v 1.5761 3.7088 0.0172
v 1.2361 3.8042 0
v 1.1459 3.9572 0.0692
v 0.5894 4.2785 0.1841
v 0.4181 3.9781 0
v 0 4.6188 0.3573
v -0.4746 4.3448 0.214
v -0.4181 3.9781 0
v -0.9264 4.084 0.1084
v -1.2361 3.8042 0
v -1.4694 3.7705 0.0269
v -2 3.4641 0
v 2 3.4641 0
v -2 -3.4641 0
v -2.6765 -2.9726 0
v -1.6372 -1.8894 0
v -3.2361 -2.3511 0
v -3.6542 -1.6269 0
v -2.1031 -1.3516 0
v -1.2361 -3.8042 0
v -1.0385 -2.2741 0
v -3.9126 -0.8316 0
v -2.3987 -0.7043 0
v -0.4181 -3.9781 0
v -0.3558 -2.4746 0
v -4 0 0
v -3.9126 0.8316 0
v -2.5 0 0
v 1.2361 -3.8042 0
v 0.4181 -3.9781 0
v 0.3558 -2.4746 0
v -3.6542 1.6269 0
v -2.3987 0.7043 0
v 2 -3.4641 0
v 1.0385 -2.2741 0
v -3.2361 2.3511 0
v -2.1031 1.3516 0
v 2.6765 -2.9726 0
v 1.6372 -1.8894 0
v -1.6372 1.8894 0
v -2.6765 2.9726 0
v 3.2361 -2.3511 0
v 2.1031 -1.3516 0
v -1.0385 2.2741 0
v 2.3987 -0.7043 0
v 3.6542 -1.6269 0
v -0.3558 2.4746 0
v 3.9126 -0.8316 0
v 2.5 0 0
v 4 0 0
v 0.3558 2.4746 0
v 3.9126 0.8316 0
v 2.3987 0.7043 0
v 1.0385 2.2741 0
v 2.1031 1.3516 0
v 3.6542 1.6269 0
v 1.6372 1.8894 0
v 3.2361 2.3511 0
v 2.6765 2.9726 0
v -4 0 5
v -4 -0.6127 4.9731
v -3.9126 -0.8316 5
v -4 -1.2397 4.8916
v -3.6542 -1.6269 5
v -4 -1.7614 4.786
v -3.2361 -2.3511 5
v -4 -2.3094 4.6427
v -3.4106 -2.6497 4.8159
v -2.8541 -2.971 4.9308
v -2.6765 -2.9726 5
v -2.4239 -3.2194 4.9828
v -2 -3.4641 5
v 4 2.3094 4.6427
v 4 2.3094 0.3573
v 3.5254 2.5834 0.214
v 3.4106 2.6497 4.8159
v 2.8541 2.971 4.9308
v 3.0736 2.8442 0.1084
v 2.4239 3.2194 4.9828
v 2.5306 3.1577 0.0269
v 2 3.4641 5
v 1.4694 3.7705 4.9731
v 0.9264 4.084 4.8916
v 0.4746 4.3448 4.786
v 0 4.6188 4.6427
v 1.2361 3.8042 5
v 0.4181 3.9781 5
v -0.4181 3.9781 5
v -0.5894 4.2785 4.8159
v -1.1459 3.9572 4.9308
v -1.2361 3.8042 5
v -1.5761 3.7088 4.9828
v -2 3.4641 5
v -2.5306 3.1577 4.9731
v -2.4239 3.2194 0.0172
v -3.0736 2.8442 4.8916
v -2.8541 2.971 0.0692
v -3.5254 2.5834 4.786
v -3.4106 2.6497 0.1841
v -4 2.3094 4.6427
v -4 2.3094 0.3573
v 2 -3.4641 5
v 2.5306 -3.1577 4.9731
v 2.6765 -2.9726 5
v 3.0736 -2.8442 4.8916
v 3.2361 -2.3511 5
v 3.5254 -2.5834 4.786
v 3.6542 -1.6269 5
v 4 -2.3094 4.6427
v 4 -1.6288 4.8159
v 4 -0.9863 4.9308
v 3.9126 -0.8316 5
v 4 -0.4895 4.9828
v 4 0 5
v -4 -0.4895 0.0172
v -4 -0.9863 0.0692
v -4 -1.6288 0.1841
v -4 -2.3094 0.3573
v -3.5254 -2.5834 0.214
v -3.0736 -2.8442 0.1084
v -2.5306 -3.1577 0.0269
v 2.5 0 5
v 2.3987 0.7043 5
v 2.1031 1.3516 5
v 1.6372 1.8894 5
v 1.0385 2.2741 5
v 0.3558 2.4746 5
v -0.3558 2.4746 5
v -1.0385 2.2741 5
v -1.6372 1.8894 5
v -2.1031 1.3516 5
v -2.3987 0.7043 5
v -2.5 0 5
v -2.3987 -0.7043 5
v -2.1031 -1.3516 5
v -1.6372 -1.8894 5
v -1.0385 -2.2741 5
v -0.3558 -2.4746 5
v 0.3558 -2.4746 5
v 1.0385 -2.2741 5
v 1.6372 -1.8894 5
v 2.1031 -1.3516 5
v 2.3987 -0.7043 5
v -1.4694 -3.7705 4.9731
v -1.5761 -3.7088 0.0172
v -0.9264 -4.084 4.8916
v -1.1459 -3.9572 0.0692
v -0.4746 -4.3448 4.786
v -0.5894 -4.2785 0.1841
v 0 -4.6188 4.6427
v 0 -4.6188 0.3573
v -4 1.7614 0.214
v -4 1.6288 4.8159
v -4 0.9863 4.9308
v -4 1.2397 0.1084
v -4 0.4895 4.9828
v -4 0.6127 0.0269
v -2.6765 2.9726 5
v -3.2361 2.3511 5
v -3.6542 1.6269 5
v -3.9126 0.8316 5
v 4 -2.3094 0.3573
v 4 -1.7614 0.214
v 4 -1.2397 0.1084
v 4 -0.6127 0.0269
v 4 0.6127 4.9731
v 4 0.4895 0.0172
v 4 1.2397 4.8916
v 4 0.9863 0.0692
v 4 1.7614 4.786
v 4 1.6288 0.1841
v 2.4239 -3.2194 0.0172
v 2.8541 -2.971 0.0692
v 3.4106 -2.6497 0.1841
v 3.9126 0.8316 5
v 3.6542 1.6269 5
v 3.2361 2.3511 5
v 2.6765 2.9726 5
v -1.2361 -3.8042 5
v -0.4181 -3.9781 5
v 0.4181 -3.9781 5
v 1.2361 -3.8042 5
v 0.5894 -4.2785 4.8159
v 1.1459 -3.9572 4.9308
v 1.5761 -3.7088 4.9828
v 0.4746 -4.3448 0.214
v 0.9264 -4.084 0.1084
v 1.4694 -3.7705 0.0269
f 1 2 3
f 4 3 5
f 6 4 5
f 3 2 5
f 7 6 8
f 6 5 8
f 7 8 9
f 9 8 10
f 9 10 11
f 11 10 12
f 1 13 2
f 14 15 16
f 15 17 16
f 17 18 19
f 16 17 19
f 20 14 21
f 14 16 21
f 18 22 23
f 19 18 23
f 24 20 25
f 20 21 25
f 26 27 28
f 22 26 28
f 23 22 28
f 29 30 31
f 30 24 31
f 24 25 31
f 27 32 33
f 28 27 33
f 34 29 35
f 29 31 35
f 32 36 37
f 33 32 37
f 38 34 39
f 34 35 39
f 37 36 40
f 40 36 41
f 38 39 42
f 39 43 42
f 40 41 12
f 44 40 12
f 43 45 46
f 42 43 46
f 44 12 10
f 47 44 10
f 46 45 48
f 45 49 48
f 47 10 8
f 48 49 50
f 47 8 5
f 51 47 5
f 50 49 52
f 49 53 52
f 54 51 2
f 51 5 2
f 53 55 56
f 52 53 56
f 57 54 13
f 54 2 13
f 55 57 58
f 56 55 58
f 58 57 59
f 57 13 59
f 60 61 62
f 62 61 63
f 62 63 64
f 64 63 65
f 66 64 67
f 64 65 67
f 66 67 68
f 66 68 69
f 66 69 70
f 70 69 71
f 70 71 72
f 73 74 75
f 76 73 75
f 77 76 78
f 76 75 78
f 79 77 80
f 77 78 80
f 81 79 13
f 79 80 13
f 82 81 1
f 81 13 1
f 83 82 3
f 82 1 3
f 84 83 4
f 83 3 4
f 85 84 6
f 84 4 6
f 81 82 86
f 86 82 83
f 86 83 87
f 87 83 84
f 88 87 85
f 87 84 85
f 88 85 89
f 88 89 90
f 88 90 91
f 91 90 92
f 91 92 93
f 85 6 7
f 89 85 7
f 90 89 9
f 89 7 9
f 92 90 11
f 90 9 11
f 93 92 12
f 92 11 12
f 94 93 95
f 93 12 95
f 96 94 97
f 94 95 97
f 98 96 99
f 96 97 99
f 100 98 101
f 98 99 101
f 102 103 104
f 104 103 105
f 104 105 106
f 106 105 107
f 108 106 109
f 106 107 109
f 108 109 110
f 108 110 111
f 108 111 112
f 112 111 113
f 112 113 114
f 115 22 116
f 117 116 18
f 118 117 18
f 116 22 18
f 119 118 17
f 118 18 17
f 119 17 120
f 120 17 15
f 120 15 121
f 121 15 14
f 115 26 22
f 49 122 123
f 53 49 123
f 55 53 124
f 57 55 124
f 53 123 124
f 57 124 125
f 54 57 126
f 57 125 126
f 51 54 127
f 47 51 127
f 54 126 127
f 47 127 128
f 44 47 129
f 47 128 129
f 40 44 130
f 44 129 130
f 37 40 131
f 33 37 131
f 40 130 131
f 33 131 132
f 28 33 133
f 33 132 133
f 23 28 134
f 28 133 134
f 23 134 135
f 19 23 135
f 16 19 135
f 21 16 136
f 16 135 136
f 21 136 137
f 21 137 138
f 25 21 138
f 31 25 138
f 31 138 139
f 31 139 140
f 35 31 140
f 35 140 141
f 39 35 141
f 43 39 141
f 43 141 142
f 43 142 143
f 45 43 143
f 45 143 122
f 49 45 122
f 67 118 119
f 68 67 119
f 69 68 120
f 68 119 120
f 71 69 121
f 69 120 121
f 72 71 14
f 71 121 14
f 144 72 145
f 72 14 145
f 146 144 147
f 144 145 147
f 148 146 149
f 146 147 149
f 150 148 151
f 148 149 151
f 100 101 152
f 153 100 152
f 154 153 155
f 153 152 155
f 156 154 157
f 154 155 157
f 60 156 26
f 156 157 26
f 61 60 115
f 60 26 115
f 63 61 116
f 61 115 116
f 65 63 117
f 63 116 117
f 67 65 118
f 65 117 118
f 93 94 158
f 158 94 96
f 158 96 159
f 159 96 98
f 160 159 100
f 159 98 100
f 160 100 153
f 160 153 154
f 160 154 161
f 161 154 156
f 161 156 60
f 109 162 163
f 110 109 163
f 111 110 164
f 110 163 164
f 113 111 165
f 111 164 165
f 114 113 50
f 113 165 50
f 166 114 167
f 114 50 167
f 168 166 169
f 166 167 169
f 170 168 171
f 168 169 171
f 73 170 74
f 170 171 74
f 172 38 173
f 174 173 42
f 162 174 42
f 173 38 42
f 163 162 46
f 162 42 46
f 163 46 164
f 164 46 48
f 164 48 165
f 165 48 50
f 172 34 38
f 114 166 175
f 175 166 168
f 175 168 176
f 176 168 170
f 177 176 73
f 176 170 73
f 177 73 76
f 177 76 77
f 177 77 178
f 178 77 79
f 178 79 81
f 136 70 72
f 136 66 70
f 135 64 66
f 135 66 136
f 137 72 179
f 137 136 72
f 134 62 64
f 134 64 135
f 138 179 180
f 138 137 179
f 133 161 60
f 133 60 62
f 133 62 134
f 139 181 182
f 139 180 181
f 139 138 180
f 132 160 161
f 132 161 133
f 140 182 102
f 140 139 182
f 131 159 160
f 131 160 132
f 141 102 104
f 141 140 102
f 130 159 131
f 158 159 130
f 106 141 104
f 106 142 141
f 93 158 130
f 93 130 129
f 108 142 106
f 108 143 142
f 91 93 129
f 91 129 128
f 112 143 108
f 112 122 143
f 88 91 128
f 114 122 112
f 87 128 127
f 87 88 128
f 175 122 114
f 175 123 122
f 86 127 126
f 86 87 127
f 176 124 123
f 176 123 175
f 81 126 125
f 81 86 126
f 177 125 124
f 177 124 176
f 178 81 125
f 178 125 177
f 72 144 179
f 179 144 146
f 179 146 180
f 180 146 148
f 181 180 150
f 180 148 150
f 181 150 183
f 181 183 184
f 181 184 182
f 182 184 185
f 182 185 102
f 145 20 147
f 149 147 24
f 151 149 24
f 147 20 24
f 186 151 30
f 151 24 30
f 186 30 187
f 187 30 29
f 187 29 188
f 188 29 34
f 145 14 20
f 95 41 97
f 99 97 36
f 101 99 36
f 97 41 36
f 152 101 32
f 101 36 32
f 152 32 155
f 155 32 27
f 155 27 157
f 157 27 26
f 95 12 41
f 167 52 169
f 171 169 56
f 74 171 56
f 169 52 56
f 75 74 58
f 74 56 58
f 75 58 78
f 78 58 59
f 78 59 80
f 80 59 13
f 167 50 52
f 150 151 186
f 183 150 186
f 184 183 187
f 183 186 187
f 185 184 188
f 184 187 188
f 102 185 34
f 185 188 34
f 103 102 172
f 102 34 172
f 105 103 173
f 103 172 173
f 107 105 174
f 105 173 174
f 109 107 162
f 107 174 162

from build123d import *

# Parameters (mm, degrees)
BOSS_EXTRU_1_DEPTH      = 5
ENL_V_MAT_EXTRU_1_REACH = 7
ESQUISSE2_R             = 2.5


with BuildPart() as part:
    # Esquisse1 → Boss.-Extru.1 (new body)
    with BuildSketch(Plane.XY):
        Polygon((0, 4.618802154), (-4, 2.309401077), (-4, -2.309401077), (0, -4.618802154), (4, -2.309401077), (4, 2.309401077), align=None)
    extrude(amount=BOSS_EXTRU_1_DEPTH)

    # Esquisse2 → Enlèv. mat.-Extru.1 (cut, up to next)
    with BuildSketch(Plane.XY.offset(5), mode=Mode.PRIVATE) as enl_v_mat_extru_1_sk1:
        Circle(ESQUISSE2_R)
    enl_v_mat_extru_1_tool1 = extrude(enl_v_mat_extru_1_sk1.sketch, amount=-ENL_V_MAT_EXTRU_1_REACH, mode=Mode.PRIVATE) & part.part
    add(enl_v_mat_extru_1_tool1.solids().sort_by_distance((0, 0, 5))[0], mode=Mode.SUBTRACT)

    # Esquisse4 → Enlèvement de matière-Révolution8 (revolve, cut)
    with BuildSketch(Plane(origin=(0, 0, 0), x_dir=(1, 0, 0), z_dir=(0, 1, 0))):
        Polygon((-8.330127019, -2.5), (-2.267949192, 1), (-9.330127019, 1), (-9.330127019, -6), (-2.267949192, -6), align=None)
    revolve(axis=Axis((0, 0, 0), (0, 0, 1)), mode=Mode.SUBTRACT)


solid = part.part
